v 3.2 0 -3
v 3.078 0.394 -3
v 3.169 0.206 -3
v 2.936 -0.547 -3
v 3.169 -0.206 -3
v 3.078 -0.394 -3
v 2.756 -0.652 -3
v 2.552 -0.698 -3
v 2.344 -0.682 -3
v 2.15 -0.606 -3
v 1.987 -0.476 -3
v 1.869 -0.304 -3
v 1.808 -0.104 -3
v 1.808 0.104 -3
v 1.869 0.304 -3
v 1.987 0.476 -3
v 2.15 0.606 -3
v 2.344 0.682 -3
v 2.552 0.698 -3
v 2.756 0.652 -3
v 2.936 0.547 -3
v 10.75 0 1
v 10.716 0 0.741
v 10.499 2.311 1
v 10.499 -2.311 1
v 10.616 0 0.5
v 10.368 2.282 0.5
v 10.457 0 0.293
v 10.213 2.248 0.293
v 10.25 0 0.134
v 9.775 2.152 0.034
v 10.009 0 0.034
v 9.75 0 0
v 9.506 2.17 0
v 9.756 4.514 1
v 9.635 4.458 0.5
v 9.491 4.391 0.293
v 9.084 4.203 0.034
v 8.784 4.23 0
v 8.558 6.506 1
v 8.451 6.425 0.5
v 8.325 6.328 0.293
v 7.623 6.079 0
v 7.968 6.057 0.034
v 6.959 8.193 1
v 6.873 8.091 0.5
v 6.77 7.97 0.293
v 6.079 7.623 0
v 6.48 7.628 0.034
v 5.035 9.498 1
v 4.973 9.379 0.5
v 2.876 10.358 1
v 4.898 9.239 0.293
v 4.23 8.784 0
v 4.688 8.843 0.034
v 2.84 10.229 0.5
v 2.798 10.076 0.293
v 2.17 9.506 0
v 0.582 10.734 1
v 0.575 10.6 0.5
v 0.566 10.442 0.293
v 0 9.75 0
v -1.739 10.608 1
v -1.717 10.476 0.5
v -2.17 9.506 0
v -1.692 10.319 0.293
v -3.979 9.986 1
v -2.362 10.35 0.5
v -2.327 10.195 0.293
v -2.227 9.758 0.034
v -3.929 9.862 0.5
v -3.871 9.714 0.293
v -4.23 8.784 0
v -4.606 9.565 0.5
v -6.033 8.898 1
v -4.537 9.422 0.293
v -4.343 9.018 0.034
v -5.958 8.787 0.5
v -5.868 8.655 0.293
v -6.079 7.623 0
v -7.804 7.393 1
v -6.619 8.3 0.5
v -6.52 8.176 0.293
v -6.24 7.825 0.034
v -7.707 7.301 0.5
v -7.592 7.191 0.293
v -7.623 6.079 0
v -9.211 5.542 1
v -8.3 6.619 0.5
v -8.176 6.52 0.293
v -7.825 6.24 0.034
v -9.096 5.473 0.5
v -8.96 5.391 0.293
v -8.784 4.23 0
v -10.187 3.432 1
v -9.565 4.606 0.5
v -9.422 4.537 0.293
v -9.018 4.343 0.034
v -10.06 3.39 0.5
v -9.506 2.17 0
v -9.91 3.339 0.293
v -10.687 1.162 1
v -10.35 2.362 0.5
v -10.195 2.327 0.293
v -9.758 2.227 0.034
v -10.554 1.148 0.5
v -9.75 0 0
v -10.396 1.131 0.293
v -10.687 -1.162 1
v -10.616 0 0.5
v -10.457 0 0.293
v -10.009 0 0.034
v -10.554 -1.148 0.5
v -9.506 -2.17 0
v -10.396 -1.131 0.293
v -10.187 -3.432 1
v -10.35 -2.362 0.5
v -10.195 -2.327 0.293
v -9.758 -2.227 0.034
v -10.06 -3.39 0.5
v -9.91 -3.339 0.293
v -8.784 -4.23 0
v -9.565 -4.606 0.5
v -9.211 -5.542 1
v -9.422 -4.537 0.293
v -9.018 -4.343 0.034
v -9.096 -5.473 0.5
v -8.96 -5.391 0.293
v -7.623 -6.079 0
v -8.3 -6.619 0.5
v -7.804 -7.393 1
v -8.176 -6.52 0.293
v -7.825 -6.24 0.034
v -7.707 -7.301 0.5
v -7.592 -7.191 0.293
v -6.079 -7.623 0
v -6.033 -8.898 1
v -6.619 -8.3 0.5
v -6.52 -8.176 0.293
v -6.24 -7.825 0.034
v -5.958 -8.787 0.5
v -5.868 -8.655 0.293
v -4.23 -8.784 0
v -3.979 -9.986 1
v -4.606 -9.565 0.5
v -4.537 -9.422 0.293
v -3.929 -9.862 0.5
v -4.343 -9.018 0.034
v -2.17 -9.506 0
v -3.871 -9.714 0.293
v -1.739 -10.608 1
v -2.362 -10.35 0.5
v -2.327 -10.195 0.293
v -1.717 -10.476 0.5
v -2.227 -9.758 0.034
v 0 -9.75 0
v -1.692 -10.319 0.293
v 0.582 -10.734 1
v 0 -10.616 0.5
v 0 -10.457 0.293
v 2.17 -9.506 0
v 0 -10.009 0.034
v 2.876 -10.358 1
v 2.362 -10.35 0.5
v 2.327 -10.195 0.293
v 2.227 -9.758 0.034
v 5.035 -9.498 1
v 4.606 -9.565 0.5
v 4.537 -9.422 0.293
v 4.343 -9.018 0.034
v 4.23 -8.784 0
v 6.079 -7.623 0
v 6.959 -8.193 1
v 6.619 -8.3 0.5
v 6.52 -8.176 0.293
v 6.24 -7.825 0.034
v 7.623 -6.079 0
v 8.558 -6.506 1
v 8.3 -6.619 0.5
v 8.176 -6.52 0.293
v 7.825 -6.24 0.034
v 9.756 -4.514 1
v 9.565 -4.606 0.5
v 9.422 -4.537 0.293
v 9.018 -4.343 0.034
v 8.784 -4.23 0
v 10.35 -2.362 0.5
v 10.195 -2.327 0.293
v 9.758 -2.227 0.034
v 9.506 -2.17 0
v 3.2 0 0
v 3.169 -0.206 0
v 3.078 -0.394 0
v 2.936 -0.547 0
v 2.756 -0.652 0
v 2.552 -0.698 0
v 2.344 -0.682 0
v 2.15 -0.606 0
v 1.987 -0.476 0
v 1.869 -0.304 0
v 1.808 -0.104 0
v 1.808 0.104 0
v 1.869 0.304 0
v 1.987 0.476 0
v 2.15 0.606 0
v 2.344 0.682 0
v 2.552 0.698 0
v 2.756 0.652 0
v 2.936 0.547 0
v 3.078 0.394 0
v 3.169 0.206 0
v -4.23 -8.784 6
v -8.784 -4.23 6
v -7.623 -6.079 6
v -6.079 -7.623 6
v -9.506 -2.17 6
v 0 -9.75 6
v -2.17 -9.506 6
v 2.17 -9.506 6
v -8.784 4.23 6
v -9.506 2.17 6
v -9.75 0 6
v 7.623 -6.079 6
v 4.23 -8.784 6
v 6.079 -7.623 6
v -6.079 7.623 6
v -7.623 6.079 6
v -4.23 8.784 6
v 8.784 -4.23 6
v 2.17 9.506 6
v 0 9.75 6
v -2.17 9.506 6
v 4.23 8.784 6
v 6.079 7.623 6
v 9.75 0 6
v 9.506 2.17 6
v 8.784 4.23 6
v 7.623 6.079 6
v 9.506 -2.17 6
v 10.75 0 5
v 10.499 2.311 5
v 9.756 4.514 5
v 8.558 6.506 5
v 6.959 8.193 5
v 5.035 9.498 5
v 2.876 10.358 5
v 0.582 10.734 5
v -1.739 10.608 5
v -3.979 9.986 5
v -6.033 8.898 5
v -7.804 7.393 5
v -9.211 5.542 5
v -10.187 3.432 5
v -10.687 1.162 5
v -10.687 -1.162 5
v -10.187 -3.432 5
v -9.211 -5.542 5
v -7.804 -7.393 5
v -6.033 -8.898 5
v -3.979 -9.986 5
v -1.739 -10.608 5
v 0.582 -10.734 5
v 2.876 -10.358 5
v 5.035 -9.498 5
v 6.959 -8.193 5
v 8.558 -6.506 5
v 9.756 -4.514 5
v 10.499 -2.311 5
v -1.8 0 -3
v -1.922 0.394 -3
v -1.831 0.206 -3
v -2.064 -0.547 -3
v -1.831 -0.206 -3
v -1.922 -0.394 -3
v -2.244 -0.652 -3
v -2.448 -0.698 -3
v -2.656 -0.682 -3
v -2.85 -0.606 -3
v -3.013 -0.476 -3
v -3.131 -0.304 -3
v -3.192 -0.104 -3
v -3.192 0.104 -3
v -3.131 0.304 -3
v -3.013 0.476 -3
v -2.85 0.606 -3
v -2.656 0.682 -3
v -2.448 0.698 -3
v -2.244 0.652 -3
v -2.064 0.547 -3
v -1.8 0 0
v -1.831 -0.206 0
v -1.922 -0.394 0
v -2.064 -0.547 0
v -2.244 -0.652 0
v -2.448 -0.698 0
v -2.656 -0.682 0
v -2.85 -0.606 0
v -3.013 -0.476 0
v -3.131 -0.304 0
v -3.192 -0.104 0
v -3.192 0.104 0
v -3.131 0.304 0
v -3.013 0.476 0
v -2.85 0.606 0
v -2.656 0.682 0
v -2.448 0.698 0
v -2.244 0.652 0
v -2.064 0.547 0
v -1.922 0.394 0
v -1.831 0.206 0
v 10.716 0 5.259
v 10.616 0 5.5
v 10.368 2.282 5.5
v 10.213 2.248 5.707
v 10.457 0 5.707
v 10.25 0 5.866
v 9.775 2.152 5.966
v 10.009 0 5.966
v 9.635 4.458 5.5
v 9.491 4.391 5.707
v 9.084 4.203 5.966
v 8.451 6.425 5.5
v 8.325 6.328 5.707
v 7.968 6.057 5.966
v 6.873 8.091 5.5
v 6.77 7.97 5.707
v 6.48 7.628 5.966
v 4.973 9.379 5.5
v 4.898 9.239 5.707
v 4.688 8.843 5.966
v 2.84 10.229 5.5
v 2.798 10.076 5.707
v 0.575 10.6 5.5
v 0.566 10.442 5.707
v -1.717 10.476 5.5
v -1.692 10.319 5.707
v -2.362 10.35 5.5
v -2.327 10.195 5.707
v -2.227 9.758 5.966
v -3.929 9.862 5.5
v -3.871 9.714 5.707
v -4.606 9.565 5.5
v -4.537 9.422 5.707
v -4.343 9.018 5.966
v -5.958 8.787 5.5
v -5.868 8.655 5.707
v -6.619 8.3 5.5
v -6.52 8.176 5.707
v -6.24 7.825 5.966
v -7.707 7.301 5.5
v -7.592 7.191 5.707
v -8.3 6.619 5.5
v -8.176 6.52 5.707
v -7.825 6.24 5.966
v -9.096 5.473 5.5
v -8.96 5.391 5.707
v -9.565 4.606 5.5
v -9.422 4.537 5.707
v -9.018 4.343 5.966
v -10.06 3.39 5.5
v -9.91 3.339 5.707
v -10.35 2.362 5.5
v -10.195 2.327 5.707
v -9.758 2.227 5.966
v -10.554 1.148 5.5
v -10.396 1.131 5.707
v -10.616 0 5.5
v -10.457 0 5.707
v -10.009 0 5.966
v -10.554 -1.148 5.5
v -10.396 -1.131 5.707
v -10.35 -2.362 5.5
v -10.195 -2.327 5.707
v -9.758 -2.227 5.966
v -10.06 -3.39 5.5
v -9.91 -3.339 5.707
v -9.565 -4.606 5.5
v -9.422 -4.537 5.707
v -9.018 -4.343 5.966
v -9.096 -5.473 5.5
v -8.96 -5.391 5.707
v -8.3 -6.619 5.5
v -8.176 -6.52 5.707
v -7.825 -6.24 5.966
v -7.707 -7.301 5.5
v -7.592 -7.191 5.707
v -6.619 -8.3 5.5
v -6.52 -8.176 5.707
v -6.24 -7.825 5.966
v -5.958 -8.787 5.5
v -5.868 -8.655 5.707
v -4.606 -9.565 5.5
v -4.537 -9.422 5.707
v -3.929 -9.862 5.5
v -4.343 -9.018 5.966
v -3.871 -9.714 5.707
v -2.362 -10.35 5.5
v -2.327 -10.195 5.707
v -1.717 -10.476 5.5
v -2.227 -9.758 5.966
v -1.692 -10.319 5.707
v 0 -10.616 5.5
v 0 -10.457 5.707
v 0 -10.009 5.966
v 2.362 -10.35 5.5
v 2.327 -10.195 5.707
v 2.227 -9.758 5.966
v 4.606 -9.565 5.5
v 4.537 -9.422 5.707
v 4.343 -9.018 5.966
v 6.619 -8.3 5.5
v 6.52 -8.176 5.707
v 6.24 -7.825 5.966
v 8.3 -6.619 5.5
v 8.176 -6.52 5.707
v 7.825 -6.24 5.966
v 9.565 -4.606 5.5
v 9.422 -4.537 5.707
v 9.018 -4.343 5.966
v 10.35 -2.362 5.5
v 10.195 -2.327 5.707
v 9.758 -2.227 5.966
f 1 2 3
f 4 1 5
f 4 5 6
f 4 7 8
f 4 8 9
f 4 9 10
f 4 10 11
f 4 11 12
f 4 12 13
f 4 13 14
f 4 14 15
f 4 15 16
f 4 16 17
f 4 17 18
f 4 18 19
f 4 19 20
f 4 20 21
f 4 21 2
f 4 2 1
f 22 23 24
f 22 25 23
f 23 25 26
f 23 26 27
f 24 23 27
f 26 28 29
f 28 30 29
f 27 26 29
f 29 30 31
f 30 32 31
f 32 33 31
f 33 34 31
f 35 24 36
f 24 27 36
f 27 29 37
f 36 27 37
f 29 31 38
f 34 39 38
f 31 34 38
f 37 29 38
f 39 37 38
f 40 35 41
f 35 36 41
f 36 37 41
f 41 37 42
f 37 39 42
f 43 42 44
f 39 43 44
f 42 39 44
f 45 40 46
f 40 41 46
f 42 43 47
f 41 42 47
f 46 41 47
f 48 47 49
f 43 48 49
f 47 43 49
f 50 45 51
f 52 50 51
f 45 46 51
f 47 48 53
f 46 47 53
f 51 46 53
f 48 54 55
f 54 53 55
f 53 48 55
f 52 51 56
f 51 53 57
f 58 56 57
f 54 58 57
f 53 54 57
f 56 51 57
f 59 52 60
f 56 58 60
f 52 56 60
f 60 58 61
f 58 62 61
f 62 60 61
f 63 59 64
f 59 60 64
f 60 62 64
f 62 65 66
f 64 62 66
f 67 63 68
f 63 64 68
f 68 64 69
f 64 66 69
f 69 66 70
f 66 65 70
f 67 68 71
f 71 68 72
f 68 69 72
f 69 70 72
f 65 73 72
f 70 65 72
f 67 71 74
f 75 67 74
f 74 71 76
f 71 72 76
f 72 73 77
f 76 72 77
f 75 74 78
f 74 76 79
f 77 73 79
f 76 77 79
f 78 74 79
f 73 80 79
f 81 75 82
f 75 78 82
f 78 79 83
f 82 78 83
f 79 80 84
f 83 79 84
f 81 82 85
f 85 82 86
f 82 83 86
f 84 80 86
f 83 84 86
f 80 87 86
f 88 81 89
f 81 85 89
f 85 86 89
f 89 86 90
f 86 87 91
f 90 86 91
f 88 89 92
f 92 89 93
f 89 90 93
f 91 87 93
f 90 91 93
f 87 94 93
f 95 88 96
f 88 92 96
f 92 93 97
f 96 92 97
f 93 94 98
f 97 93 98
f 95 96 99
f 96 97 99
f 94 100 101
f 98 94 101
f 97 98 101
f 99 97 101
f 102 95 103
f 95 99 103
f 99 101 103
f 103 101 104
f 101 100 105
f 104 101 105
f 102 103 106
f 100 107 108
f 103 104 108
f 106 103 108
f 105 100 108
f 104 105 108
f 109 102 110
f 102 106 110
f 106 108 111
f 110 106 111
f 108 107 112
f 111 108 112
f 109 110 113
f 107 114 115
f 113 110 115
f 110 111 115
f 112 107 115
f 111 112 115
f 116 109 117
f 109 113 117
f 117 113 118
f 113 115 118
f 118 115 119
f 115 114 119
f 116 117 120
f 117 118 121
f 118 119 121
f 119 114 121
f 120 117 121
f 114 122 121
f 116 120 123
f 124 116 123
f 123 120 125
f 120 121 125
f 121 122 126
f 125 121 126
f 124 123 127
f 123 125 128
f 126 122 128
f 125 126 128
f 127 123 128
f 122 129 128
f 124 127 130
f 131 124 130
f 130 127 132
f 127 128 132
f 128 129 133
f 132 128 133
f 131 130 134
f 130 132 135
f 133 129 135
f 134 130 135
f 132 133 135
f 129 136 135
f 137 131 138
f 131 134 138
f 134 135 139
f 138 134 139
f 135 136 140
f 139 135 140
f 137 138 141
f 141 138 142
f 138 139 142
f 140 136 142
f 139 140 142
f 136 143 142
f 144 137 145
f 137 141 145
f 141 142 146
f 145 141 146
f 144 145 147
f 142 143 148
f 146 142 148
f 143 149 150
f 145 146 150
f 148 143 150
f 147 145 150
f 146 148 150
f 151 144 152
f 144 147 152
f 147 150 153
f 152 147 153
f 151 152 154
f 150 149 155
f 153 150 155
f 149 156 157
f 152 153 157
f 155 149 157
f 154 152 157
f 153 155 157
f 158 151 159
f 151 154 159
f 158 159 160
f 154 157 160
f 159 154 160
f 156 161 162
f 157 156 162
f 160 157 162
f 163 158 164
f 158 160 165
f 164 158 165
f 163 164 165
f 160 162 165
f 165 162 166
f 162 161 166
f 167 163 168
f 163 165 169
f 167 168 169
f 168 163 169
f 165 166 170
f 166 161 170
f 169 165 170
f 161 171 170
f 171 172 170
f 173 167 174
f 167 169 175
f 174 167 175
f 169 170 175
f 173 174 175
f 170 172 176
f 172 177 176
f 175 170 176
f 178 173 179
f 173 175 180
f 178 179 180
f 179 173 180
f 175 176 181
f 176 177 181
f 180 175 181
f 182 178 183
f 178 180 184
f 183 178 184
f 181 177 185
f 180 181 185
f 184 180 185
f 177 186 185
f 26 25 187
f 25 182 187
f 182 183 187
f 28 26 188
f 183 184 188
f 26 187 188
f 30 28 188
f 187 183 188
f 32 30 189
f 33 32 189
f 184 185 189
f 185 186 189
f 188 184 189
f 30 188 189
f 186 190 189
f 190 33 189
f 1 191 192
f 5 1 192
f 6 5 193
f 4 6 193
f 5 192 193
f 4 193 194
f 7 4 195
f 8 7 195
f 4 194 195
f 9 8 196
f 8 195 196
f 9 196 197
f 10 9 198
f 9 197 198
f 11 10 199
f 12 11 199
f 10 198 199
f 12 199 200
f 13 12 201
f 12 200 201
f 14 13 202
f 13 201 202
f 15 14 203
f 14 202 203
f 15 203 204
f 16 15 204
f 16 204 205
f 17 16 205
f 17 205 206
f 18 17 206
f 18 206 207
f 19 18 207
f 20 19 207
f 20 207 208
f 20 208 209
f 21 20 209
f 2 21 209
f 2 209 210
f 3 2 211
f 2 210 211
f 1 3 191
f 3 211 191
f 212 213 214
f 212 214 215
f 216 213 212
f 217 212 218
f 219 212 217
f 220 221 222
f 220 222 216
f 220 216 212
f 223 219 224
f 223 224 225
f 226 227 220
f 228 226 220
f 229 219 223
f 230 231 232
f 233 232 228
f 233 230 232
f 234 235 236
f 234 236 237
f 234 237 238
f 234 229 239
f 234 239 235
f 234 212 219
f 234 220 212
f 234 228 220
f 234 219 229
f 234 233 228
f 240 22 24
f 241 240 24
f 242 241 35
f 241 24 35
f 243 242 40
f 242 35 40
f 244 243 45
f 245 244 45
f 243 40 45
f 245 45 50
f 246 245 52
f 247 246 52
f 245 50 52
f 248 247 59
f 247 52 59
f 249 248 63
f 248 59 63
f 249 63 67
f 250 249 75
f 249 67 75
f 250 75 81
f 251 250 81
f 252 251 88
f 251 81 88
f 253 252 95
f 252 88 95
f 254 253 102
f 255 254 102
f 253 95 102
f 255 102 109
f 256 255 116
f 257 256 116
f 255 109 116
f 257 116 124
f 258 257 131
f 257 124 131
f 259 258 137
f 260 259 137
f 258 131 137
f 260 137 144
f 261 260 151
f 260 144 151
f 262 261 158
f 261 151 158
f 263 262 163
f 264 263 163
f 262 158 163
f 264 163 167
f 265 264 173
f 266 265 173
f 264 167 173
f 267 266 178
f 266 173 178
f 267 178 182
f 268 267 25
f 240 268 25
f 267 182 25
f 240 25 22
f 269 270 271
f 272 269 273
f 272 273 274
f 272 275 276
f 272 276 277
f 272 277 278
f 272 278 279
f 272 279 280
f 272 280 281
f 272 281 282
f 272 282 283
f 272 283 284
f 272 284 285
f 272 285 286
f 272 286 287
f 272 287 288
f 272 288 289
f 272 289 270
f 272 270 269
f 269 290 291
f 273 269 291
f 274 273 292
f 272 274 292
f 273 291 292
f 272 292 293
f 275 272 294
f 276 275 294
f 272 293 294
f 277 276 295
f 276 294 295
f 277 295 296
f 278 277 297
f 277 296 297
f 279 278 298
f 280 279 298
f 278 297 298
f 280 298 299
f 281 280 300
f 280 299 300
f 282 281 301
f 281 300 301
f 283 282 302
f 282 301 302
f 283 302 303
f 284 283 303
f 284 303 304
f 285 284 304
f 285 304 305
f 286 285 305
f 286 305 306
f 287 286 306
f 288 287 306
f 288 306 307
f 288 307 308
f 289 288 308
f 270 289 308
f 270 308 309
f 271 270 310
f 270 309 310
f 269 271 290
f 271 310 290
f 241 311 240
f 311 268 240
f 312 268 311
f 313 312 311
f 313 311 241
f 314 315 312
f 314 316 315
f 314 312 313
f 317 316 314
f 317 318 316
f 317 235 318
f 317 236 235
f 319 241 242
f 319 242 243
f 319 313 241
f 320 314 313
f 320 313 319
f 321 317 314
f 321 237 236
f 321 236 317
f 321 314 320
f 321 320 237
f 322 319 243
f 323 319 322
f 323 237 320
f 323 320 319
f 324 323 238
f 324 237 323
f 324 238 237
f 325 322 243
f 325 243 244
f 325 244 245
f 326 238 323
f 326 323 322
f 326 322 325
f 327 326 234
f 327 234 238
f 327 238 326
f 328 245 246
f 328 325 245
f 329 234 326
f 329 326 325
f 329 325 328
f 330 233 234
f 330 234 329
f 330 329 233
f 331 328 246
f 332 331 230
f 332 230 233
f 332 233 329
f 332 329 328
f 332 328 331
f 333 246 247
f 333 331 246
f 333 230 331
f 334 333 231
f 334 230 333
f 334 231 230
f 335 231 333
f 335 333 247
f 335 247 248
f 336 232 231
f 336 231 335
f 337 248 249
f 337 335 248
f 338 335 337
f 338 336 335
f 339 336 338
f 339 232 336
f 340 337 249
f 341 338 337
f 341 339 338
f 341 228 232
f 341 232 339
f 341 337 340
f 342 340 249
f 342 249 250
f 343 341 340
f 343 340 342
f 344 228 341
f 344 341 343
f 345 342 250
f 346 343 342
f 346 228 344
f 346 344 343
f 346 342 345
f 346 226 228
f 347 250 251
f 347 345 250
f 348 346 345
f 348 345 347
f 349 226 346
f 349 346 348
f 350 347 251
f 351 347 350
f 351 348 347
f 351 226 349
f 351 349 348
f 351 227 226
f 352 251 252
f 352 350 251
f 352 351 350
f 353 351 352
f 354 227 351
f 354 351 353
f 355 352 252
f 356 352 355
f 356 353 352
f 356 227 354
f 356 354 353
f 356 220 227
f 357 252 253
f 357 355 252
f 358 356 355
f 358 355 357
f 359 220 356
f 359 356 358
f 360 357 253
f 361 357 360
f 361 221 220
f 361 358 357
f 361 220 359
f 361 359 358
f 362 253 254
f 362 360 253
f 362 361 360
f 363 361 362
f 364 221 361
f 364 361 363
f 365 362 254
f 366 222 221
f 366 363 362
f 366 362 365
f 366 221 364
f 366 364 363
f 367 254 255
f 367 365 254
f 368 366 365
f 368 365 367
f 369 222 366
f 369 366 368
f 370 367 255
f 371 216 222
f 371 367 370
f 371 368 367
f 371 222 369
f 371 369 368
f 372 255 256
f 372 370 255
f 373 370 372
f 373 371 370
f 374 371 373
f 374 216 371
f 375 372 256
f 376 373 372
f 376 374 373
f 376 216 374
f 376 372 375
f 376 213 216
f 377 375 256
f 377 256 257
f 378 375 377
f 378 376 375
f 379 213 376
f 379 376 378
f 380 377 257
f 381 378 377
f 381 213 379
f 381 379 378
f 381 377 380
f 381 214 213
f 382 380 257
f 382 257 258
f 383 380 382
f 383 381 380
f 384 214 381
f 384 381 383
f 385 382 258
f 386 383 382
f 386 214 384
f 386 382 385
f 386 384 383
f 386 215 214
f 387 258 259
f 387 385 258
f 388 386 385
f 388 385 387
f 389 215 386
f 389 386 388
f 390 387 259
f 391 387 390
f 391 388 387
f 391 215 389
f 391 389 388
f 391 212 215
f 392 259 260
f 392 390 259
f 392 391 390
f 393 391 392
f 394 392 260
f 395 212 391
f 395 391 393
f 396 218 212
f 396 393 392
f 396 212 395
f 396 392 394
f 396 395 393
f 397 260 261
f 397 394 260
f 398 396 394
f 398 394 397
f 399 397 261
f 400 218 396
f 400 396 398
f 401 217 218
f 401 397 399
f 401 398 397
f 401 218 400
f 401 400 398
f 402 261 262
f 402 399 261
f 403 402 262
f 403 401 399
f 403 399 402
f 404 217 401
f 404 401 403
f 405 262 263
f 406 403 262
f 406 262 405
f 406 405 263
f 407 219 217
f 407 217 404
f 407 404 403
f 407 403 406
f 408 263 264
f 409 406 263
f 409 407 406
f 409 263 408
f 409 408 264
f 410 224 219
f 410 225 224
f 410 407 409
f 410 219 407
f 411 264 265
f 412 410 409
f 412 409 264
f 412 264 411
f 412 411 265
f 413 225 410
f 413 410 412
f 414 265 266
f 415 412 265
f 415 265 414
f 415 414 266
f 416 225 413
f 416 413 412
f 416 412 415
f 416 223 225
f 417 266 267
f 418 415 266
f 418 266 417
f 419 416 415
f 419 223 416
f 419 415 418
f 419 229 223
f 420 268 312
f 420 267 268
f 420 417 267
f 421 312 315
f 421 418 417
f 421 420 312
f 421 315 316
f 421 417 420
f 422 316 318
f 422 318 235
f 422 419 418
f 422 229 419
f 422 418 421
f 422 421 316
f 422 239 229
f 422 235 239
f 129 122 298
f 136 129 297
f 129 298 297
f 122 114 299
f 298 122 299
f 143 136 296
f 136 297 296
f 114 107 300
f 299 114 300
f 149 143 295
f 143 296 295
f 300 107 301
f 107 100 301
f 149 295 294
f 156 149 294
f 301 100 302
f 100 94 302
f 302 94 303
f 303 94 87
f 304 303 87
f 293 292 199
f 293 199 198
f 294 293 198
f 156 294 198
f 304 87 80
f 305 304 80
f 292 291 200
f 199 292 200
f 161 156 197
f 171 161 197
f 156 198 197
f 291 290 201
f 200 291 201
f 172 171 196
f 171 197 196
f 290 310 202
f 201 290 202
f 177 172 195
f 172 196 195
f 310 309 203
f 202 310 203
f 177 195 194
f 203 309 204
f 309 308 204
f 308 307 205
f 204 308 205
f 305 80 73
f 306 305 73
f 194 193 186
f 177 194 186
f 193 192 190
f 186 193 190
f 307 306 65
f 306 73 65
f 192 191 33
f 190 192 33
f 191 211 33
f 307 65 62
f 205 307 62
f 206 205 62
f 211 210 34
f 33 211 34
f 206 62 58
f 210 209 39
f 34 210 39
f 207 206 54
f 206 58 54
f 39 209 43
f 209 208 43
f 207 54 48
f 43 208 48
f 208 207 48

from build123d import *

# Parameters (mm, degrees)
ESQUISSE1_R        = 10.75
BOSS_EXTRU_1_DEPTH = 6
ESQUISSE3_R        = 0.7
BOSS_EXTRU_2_DEPTH = 3
CONG_1_R           = 1


with BuildPart() as part:
    # Esquisse1 → Boss.-Extru.1 (new body)
    with BuildSketch(Plane.XY):
        Circle(ESQUISSE1_R)
    extrude(amount=BOSS_EXTRU_1_DEPTH)

    # Esquisse3 → Boss.-Extru.2 (add)
    with BuildSketch(Plane(origin=(0, 0, 0), x_dir=(-1, 0, 0), z_dir=(0, 0, -1))):
        with Locations(Location((-2.5, 0, 0), (0, 0, 180))):
            Circle(ESQUISSE3_R)
        with Locations(Location((2.5, 0, 0), (0, 0, 180))):
            Circle(ESQUISSE3_R)
    extrude(amount=BOSS_EXTRU_2_DEPTH)

    # Congé1
    cong_1_edges = [part.edges().sort_by_distance(p)[0] for p in [
        (-10.75, 0, 0),
        (-10.75, 0, 6),
    ]]
    fillet(cong_1_edges, radius=CONG_1_R)


solid = part.part
